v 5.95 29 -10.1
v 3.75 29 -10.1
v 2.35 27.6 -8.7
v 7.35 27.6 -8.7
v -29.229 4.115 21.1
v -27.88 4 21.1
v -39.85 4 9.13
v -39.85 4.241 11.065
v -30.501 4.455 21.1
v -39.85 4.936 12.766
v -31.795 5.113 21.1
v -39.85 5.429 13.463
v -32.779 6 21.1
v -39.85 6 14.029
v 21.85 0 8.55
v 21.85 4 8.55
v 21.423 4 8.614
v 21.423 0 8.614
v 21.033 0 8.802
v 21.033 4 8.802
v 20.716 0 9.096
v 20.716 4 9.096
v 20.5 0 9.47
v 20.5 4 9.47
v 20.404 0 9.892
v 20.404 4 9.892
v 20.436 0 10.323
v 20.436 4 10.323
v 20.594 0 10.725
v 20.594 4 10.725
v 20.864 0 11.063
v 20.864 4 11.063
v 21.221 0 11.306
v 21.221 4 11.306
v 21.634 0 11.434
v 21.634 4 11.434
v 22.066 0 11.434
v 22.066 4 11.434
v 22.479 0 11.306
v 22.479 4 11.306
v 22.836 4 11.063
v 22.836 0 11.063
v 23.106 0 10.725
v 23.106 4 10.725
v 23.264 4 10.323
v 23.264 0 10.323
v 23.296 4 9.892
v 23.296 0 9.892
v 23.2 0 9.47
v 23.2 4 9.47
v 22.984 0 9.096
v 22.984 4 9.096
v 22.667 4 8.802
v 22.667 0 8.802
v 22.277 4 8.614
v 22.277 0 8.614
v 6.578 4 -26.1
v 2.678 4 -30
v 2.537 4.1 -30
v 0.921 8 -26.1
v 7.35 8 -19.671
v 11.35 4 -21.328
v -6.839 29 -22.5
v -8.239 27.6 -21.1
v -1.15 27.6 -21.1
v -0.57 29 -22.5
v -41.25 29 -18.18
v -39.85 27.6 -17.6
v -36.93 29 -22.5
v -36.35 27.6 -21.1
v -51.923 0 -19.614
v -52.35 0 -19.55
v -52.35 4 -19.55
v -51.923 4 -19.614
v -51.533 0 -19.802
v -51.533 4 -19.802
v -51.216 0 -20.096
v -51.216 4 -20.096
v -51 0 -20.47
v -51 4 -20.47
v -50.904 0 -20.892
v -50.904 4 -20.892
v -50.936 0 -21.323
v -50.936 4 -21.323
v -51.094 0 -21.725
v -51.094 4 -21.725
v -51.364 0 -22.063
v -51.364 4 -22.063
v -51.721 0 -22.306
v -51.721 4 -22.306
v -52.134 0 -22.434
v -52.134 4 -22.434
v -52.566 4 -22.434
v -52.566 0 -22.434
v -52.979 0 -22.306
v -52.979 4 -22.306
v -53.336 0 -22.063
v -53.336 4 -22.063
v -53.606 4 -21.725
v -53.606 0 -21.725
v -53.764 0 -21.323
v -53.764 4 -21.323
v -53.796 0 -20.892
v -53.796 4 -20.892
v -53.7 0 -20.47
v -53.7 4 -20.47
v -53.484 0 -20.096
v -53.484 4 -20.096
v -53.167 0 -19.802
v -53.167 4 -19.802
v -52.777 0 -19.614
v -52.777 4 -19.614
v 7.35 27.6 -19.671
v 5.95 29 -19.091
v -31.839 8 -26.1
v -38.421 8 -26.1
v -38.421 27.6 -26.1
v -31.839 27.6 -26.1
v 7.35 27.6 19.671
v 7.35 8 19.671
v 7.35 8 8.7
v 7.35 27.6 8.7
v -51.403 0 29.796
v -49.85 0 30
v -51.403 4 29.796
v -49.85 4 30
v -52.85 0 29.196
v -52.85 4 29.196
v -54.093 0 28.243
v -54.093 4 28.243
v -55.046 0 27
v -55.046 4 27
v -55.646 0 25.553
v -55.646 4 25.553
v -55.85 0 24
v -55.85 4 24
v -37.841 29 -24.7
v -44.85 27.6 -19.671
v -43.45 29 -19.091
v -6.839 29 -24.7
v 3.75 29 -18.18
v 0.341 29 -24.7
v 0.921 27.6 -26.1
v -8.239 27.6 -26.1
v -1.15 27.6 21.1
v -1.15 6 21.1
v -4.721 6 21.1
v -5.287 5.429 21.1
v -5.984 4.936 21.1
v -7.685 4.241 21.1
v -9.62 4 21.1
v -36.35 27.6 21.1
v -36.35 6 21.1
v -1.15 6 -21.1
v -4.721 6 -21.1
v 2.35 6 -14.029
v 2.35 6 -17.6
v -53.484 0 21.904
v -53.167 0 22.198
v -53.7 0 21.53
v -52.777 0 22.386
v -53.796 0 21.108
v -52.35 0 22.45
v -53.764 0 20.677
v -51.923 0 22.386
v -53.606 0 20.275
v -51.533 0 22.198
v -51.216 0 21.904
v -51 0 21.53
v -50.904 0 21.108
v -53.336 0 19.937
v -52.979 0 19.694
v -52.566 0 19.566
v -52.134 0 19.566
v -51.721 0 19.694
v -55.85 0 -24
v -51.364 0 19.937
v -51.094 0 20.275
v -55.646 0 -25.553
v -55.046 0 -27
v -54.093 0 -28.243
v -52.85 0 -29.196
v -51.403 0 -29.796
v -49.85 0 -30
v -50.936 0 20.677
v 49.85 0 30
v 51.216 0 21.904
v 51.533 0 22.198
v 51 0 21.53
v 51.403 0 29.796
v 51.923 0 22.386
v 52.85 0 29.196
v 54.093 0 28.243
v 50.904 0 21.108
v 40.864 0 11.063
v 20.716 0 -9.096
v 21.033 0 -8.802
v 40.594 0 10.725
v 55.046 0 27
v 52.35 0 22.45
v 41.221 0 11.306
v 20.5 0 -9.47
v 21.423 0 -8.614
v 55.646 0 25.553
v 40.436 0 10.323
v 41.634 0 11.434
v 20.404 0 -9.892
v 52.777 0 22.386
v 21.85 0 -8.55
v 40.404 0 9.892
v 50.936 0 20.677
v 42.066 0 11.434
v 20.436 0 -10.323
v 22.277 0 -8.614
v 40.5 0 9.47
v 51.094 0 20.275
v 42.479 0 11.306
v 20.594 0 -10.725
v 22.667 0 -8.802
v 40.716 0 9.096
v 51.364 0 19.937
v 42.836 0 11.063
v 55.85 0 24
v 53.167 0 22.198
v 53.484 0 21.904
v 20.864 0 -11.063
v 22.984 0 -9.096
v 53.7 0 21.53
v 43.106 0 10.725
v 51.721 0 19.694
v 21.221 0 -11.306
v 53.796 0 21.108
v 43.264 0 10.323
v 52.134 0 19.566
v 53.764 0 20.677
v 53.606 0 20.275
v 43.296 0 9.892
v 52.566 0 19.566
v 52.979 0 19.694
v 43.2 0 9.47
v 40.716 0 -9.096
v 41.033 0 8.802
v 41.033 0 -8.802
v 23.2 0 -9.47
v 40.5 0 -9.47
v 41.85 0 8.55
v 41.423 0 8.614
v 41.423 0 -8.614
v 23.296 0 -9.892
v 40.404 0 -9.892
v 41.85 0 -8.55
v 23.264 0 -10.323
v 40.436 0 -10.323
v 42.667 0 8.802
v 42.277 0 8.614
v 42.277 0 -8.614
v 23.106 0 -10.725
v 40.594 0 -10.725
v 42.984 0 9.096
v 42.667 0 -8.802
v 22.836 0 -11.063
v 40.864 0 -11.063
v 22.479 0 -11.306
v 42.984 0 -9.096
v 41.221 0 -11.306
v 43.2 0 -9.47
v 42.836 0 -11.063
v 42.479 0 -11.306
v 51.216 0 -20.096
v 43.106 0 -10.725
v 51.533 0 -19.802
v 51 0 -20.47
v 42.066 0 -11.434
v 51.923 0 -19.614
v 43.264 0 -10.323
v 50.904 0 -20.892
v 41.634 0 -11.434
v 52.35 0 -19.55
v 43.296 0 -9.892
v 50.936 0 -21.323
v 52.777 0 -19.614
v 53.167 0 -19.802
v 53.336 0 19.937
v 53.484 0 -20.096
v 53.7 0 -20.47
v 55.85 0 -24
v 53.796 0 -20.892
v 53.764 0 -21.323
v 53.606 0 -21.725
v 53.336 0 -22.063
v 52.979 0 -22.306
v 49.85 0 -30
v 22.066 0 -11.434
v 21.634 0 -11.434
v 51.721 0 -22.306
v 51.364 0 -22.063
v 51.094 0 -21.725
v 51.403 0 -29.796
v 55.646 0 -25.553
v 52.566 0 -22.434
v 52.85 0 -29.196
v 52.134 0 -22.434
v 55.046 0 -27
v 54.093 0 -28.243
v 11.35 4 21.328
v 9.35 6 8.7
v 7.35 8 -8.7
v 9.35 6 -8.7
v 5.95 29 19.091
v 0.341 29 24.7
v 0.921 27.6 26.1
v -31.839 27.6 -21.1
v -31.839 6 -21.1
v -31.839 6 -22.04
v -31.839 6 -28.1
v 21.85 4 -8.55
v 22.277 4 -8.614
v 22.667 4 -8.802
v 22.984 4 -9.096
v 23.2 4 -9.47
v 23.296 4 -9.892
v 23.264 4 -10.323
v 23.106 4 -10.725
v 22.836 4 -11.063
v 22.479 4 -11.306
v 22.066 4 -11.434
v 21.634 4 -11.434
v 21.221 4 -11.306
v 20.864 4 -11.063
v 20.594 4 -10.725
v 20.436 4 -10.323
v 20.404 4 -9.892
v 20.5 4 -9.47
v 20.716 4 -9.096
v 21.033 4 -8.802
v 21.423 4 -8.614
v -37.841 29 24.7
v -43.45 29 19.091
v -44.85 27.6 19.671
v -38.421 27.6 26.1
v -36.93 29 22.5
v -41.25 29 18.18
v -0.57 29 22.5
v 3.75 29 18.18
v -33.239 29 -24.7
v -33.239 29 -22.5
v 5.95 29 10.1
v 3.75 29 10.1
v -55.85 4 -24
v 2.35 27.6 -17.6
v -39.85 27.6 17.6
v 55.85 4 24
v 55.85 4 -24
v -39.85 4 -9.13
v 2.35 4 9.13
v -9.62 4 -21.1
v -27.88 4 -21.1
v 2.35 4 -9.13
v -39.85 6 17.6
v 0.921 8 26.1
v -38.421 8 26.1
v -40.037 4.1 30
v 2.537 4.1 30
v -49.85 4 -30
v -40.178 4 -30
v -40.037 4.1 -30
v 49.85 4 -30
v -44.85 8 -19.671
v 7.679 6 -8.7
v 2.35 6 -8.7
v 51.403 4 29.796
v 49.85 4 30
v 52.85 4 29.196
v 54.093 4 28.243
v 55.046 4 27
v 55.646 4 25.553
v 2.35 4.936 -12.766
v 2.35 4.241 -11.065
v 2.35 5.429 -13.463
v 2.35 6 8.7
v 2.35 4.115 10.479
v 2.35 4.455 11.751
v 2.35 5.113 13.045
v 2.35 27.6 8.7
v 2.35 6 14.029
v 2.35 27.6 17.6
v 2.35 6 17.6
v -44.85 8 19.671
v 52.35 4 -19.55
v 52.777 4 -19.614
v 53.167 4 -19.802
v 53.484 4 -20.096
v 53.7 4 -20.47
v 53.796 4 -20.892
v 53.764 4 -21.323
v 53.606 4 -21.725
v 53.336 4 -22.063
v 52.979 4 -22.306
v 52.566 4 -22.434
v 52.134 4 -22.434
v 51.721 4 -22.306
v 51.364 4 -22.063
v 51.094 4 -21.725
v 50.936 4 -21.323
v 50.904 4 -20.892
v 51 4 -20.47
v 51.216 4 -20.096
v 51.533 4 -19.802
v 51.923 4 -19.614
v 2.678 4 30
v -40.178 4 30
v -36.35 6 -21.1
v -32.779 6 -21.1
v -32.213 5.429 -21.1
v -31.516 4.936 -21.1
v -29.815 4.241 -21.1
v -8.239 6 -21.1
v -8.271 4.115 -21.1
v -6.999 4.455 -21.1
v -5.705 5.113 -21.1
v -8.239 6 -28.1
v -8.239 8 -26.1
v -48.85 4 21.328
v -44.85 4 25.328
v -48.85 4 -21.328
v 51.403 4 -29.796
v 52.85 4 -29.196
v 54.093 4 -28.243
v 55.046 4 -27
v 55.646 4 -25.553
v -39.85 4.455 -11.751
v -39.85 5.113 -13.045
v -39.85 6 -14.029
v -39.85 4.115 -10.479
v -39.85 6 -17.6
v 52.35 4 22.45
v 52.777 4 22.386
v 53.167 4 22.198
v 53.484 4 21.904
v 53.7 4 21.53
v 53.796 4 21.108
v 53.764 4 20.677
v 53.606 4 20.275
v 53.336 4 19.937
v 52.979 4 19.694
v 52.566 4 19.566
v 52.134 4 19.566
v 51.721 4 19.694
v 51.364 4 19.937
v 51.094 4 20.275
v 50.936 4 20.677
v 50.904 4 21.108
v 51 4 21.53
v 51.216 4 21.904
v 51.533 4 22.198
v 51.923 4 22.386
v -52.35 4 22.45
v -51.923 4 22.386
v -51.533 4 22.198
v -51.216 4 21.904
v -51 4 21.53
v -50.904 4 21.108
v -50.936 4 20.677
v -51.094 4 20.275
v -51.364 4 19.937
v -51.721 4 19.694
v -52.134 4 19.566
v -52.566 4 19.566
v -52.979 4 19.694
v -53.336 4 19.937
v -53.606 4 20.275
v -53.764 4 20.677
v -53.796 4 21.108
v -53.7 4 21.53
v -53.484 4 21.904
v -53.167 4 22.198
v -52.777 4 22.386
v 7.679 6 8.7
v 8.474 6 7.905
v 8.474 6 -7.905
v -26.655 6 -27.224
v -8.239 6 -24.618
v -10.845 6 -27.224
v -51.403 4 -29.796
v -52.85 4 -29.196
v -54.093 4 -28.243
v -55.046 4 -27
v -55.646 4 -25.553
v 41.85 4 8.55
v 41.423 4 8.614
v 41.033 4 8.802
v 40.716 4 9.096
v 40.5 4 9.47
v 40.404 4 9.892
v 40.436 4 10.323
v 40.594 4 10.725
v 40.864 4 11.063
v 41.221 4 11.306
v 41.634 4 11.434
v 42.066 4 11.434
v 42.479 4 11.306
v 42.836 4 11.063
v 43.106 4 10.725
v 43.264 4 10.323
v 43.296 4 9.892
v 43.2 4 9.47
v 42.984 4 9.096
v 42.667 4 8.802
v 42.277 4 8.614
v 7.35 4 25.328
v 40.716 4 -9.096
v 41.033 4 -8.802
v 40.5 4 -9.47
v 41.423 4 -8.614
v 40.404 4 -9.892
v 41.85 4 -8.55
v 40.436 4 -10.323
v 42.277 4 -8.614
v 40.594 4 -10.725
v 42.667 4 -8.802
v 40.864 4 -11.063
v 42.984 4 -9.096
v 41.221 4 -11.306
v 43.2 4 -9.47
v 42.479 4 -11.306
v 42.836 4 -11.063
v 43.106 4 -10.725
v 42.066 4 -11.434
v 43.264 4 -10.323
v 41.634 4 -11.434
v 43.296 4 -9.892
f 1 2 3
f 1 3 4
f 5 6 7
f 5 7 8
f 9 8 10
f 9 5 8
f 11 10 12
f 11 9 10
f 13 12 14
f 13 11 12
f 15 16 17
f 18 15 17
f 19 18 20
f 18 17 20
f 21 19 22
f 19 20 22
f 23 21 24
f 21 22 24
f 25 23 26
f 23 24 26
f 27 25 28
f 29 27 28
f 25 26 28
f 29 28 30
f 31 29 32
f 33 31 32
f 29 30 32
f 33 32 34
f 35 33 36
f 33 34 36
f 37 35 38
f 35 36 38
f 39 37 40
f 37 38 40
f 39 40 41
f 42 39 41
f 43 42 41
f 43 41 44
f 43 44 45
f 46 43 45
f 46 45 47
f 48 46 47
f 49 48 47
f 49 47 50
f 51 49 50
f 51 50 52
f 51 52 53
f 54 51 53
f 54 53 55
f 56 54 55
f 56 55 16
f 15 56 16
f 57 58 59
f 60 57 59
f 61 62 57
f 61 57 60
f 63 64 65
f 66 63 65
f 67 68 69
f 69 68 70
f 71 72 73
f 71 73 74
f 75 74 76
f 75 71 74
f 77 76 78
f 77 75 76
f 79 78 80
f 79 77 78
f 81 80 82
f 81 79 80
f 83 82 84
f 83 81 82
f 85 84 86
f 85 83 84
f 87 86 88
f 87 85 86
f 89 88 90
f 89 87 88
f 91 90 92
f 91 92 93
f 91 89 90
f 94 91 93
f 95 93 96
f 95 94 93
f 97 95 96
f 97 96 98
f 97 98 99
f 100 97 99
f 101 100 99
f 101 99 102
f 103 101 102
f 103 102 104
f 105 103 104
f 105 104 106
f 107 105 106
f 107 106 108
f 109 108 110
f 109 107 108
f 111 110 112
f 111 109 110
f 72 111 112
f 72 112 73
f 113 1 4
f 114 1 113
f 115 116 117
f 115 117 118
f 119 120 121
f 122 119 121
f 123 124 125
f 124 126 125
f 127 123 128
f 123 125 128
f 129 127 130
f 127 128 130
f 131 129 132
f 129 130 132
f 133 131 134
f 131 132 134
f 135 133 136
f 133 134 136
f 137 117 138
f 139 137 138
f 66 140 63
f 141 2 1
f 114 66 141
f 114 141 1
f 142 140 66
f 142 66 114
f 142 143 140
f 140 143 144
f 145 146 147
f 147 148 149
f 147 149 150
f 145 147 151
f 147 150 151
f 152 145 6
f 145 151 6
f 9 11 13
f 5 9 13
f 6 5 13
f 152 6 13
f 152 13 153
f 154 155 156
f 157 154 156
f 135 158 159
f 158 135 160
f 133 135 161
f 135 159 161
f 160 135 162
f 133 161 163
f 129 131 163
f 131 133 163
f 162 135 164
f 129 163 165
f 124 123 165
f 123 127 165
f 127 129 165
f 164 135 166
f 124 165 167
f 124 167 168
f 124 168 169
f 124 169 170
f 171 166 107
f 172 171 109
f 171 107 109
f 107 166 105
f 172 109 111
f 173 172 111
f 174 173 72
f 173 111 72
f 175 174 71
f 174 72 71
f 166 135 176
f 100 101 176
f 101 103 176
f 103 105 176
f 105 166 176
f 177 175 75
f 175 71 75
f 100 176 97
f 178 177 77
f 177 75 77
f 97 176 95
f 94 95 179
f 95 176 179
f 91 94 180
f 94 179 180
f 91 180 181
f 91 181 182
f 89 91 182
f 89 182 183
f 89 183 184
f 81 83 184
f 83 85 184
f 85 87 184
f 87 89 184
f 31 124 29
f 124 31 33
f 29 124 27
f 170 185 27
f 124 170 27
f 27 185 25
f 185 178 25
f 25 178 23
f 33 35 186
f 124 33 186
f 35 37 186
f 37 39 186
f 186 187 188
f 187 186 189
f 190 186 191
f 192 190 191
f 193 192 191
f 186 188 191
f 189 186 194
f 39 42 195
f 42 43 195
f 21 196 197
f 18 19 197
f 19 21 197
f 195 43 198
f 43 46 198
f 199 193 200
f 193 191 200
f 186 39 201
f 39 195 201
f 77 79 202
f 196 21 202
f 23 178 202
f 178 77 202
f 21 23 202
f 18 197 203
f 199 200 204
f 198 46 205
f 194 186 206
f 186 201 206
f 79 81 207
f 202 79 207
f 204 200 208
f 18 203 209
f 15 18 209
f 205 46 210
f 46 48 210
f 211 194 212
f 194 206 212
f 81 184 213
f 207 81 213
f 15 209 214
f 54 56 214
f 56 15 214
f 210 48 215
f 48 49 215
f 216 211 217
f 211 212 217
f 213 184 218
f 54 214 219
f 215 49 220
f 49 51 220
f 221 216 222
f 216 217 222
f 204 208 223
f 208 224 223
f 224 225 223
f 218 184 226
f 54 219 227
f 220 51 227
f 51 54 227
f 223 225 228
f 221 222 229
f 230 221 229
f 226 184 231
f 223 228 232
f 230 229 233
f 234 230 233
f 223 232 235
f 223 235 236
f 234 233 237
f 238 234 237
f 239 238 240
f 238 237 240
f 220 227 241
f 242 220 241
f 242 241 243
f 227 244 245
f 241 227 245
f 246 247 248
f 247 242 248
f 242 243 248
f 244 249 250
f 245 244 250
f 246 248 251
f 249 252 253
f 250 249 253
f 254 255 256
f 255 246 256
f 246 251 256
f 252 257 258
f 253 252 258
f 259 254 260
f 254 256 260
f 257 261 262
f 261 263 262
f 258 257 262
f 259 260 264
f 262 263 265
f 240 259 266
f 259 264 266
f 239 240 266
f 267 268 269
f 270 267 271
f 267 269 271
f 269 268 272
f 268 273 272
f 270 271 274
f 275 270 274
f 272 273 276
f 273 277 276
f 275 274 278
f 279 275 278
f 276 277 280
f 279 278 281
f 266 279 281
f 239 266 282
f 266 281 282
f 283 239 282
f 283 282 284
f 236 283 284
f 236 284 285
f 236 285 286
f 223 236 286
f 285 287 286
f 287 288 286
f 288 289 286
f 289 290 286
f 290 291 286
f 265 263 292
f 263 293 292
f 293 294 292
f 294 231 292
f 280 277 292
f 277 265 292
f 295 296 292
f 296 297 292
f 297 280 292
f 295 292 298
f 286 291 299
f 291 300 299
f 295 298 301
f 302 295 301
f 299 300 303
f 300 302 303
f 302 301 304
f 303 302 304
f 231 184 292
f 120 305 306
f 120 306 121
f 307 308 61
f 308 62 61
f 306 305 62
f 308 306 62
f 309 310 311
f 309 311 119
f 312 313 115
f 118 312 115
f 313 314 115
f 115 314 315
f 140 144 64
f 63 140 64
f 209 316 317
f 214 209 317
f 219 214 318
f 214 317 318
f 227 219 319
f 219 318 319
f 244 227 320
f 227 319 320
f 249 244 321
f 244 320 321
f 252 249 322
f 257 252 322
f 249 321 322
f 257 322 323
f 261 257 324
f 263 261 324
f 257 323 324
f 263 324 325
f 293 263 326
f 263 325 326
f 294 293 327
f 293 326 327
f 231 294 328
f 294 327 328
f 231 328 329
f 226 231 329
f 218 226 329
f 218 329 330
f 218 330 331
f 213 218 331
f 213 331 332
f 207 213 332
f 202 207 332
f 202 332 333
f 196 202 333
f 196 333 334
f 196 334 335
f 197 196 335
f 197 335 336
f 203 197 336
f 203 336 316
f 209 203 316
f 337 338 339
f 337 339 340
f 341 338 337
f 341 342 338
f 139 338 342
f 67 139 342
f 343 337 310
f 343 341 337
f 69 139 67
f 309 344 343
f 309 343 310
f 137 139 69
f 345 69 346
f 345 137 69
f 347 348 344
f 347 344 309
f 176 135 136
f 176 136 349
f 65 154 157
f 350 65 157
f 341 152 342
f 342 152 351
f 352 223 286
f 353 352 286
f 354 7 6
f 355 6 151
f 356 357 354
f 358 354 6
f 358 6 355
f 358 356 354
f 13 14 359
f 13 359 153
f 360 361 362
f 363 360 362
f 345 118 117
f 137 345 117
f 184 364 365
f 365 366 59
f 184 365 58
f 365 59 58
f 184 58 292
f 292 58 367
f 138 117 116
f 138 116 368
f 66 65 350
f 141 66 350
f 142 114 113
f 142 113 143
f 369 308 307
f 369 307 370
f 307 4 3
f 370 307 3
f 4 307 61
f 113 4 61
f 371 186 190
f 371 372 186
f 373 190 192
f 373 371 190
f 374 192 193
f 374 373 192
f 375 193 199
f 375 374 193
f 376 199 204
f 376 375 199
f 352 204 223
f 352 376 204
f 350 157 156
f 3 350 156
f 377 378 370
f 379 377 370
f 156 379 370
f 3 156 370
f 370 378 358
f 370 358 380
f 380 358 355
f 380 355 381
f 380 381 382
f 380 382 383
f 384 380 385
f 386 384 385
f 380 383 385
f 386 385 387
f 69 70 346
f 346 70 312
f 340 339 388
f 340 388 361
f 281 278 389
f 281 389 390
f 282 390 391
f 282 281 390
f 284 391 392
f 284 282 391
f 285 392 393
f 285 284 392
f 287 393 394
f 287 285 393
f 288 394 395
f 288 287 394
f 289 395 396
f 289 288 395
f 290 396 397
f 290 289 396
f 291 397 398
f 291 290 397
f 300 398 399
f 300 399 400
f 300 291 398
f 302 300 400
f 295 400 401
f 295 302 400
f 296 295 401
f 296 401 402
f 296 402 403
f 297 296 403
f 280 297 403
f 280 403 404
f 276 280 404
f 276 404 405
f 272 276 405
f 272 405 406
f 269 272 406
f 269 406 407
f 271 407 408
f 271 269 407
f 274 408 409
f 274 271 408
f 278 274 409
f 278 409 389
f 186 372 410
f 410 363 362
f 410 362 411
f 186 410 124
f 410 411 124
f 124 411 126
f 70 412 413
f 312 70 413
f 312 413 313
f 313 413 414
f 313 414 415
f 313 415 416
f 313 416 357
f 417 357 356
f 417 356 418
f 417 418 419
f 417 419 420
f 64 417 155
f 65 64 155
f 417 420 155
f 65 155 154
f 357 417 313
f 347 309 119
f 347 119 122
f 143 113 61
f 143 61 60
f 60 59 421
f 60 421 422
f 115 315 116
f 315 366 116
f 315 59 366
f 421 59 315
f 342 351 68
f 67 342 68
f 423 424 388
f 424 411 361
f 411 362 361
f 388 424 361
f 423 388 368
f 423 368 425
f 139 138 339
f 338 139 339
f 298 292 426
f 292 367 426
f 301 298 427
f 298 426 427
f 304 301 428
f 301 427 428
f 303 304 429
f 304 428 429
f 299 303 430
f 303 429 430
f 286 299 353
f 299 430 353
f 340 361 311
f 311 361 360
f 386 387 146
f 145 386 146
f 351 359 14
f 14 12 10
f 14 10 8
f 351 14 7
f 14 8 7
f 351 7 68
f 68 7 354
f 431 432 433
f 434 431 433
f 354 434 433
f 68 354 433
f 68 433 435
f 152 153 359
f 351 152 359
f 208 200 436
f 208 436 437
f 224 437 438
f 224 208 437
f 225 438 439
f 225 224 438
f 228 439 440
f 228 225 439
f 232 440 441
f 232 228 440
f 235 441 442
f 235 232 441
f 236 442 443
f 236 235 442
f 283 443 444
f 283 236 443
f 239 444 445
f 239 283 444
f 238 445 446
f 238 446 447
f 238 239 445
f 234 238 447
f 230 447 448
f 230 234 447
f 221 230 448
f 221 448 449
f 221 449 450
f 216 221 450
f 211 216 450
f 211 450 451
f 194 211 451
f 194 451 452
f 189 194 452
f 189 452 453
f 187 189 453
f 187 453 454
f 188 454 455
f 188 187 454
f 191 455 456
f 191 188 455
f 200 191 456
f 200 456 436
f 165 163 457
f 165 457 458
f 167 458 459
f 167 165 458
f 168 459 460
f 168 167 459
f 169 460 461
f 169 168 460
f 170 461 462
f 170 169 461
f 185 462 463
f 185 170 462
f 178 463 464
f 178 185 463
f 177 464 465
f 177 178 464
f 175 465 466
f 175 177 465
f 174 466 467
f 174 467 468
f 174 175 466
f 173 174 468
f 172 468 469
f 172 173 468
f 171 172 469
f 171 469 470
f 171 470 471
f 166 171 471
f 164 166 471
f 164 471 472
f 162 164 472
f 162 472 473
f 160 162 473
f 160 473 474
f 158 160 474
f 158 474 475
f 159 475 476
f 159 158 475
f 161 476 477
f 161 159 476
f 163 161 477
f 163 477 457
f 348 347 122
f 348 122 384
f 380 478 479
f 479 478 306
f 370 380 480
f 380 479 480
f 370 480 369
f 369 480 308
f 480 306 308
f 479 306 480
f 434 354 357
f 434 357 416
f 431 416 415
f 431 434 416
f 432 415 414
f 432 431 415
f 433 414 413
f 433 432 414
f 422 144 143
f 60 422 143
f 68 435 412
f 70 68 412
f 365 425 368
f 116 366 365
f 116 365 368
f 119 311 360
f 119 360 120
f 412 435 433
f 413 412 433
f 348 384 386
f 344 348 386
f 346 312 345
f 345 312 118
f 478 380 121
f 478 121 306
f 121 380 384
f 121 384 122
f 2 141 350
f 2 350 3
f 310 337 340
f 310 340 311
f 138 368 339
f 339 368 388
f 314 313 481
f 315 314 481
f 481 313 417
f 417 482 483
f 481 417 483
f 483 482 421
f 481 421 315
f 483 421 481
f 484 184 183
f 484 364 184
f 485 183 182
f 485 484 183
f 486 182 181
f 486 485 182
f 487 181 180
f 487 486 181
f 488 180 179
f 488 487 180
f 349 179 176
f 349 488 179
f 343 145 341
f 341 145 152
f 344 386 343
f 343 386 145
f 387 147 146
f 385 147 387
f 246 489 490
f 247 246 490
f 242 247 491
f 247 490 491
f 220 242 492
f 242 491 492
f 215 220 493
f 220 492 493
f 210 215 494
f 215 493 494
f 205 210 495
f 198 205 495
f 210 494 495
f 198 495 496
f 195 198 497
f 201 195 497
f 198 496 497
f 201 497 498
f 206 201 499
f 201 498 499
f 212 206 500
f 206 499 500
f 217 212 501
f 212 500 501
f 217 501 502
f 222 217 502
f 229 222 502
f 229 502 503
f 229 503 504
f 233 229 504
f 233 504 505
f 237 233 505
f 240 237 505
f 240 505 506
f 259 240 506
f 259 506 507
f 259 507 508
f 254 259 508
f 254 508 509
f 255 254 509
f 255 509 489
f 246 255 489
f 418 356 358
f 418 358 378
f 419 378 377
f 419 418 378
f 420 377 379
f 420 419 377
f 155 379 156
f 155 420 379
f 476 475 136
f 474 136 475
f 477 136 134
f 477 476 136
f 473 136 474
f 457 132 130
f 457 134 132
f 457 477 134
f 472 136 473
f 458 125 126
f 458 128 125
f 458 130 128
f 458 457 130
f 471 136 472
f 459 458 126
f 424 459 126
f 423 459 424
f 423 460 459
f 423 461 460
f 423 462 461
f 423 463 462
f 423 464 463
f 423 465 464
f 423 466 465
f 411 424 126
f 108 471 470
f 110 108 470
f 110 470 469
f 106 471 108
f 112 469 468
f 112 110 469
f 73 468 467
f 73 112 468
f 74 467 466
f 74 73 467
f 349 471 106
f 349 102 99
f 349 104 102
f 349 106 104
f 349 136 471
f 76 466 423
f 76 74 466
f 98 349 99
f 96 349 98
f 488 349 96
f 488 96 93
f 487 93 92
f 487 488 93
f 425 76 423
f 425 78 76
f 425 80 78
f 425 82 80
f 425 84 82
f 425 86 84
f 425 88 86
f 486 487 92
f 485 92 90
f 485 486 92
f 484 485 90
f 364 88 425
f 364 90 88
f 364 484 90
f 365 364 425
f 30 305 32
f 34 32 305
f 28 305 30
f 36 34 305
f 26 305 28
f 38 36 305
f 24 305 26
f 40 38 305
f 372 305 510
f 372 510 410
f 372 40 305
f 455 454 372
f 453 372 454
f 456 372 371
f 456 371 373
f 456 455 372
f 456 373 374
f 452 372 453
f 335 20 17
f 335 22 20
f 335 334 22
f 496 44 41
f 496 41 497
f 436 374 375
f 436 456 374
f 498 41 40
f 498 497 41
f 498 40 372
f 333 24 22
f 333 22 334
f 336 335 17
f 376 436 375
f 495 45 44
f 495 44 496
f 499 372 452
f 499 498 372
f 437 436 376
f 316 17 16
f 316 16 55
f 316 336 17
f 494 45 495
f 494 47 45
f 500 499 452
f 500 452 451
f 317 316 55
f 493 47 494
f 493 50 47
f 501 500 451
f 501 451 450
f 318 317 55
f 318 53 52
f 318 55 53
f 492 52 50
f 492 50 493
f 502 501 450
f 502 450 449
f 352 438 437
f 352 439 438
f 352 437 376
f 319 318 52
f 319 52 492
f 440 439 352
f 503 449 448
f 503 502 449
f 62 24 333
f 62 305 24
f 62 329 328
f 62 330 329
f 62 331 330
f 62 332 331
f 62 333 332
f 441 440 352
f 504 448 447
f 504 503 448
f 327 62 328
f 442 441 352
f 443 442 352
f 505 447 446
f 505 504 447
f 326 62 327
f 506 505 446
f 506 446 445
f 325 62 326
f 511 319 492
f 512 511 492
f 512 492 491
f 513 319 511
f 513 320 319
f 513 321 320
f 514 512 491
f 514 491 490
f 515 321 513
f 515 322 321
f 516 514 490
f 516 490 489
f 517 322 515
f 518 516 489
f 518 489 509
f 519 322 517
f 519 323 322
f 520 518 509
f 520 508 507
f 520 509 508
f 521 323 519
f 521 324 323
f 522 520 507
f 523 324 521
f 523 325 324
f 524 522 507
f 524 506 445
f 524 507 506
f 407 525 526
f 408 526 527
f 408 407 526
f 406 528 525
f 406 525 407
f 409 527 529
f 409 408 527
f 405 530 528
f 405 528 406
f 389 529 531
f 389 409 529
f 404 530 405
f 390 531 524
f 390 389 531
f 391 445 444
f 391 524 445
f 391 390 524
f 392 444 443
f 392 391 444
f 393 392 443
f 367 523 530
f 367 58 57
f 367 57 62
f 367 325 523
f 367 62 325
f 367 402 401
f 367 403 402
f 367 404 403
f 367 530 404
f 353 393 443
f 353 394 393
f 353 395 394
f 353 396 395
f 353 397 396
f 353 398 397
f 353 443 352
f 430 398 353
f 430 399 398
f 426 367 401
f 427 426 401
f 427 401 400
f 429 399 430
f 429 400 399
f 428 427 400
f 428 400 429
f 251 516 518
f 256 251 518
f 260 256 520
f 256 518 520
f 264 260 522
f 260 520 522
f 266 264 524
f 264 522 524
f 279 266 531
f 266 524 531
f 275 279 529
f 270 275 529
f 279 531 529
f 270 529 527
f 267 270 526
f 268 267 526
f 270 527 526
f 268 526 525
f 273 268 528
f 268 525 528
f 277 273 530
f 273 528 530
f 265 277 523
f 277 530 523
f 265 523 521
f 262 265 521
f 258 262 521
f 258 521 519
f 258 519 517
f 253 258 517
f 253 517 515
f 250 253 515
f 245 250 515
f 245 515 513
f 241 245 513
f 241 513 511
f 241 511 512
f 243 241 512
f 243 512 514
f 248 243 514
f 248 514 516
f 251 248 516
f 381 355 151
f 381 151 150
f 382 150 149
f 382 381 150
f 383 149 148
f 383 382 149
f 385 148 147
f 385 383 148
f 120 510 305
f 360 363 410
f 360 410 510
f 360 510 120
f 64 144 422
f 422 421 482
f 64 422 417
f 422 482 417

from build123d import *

# Parameters (mm, degrees)
SKETCH_1_W          = 111.7
SKETCH_1_H          = 60
SKETCH_1_R          = 1.45
EXTRUDE_1_DEPTH     = 4
EXTRUDE_2_DEPTH     = 25
SKETCH_4_W          = 23.6
SKETCH_4_H          = 5
SKETCH_4_W_2        = 5
SKETCH_4_H_2        = 17.4
EXTRUDE_3_DEPTH     = 2
CHAMFER_1_SIZE      = 4
FILLET_1_R          = 6
SKETCH_5_R          = 1.45
CUT_EXTRUDE_1_DEPTH = 69.148532633
CHAMFER_2_SIZE      = 1.4
FILLET_2_R          = 4


with BuildPart() as part:
    # 草图1 → 凸台-拉伸1 (new body)
    with BuildSketch(Plane(origin=(0, 0, 0), x_dir=(1, 0, 0), z_dir=(0, 1, 0))):
        Rectangle(SKETCH_1_W, SKETCH_1_H)
        with Locations(Location((-52.35, 21, 0), (0, 0, 270))):
            Circle(SKETCH_1_R, mode=Mode.SUBTRACT)
        with Locations(Location((52.35, 21, 0), (0, 0, 270))):
            Circle(SKETCH_1_R, mode=Mode.SUBTRACT)
        with Locations(Location((52.35, -21, 0), (0, 0, 270))):
            Circle(SKETCH_1_R, mode=Mode.SUBTRACT)
        with Locations(Location((-52.35, -21, 0), (0, 0, 270))):
            Circle(SKETCH_1_R, mode=Mode.SUBTRACT)
    extrude(amount=EXTRUDE_1_DEPTH)

    # 草图3 → 凸台-拉伸2 (add)
    with BuildSketch(Plane(origin=(0, 4, 0), x_dir=(1, 0, 0), z_dir=(0, 1, 0))):
        Polygon((-36.35, 21.1), (-31.839090409, 21.1), (-31.839090409, 26.1), (-38.421067812, 26.1), (-44.85, 19.671067812), (-44.85, -19.671067812), (-38.421067812, -26.1), (0.921067812, -26.1), (7.35, -19.671067812), (7.35, -8.7), (2.35, -8.7), (2.35, -17.6), (-1.15, -21.1), (-36.35, -21.1), (-39.85, -17.6), (-39.85, 17.6), align=None)
        Polygon((-8.239090409, 21.1), (-1.15, 21.1), (2.35, 17.6), (2.35, 8.7), (7.35, 8.7), (7.35, 19.671067812), (0.921067812, 26.1), (-8.239090409, 26.1), align=None)
    extrude(amount=EXTRUDE_2_DEPTH)

    # 草图4 → 凸台-拉伸3 (add)
    with BuildSketch(Plane(origin=(0, 4, 0), x_dir=(1, 0, 0), z_dir=(0, 1, 0))):
        with Locations((-20.039090409, 23.6)):
            Rectangle(SKETCH_4_W, SKETCH_4_H)
        with Locations((4.85, 0)):
            Rectangle(SKETCH_4_W_2, SKETCH_4_H_2)
        Polygon((-39.85, 17.6), (-39.85, 14.028932188), (-32.778932188, 21.1), (-36.35, 21.1), align=None)
        Polygon((-4.721067812, 21.1), (2.35, 14.028932188), (2.35, 17.6), (-1.15, 21.1), align=None)
        Polygon((2.35, -17.6), (2.35, -14.028932188), (-4.721067812, -21.1), (-1.15, -21.1), align=None)
        Polygon((-36.35, -21.1), (-32.778932188, -21.1), (-39.85, -14.028932188), (-39.85, -17.6), align=None)
    extrude(amount=EXTRUDE_3_DEPTH)

    # 倒角1
    # the kernel refuses this chamfer: 4 mm, written as the material it adds along each edge
    with BuildSketch(Plane(origin=(-31.147249892, 4, -33.373817919), x_dir=(-0.7071067811865474, 0, -0.7071067811865478), z_dir=(-0.7071067811865478, 0, 0.7071067811865474))) as chamfer_1_piece_1_section:
        Polygon((CHAMFER_1_SIZE, 0), (0, -CHAMFER_1_SIZE), (0, 0), align=None)
    chamfer_1_piece_1 = extrude(amount=29.665346996, mode=Mode.PRIVATE)
    chamfer_1_piece_1 = split(chamfer_1_piece_1, bisect_by=Plane(origin=(-31.147249892, 4, -30), z_dir=(0, 0, 1)), keep=Keep.TOP, mode=Mode.PRIVATE)
    chamfer_1_piece_1 = split(chamfer_1_piece_1, bisect_by=Plane(origin=(-39.998624946, 12.851375054, -33.373817919), z_dir=(0.7071067811865476, -0.7071067811865476, 0)), keep=Keep.TOP, mode=Mode.PRIVATE)
    chamfer_1_piece_1 = split(chamfer_1_piece_1, bisect_by=Plane(origin=(-31.147249892, 2.36309104, -31.73690896), z_dir=(0, -0.7071067811865476, 0.7071067811865476)), keep=Keep.TOP, mode=Mode.PRIVATE)
    add(chamfer_1_piece_1)
    with BuildSketch(Plane(origin=(-48.707799764, 4, -26.1), x_dir=(0, 0, -1), z_dir=(1, 0, 0))) as chamfer_1_piece_2_section:
        Polygon((CHAMFER_1_SIZE, 0), (0, CHAMFER_1_SIZE), (0, 0), align=None)
    chamfer_1_piece_2 = extrude(amount=59.915599527, mode=Mode.PRIVATE)
    chamfer_1_piece_2 = split(chamfer_1_piece_2, bisect_by=Plane(origin=(-48.707799764, 6, -26.1), z_dir=(0, -1, 0)), keep=Keep.TOP, mode=Mode.PRIVATE)
    chamfer_1_piece_2 = split(chamfer_1_piece_2, bisect_by=Plane(origin=(-48.707799764, 4, -30), z_dir=(0, 0, 1)), keep=Keep.TOP, mode=Mode.PRIVATE)
    chamfer_1_piece_2 = split(chamfer_1_piece_2, bisect_by=Plane(origin=(-34.886369307, 23.546454403, -39.921430456), z_dir=(-0.4999999999999999, -0.7071067811865478, 0.49999999999999967)), keep=Keep.TOP, mode=Mode.PRIVATE)
    chamfer_1_piece_2 = split(chamfer_1_piece_2, bisect_by=Plane(origin=(-47.550330338, 2.36309104, -24.942530574), z_dir=(0.4999999999999996, -0.7071067811865479, 0.4999999999999999)), keep=Keep.TOP, mode=Mode.PRIVATE)
    add(chamfer_1_piece_2)
    with BuildSketch(Plane(origin=(-48.707799764, 4, -26.1), x_dir=(0, 0, -1), z_dir=(1, 0, 0))) as chamfer_1_piece_3_section:
        Polygon((CHAMFER_1_SIZE, 0), (0, CHAMFER_1_SIZE), (0, 0), align=None)
    chamfer_1_piece_3 = extrude(amount=59.915599527, mode=Mode.PRIVATE)
    chamfer_1_piece_3 = split(chamfer_1_piece_3, bisect_by=Plane(origin=(-31.839090409, 4, -26.1), z_dir=(-1, 0, 0)), keep=Keep.TOP, mode=Mode.PRIVATE)
    chamfer_1_piece_3 = split(chamfer_1_piece_3, bisect_by=Plane(origin=(-48.707799764, 4, -30), z_dir=(0, 0, 1)), keep=Keep.TOP, mode=Mode.PRIVATE)
    chamfer_1_piece_3 = split(chamfer_1_piece_3, bisect_by=Plane(origin=(-47.550330338, 2.36309104, -24.942530574), z_dir=(0.4999999999999996, -0.7071067811865479, 0.4999999999999999)), keep=Keep.TOP, mode=Mode.PRIVATE)
    add(chamfer_1_piece_3)
    with BuildSketch(Plane(origin=(-48.707799764, 4, -26.1), x_dir=(0, 0, -1), z_dir=(1, 0, 0))) as chamfer_1_piece_4_section:
        Polygon((CHAMFER_1_SIZE, 0), (0, CHAMFER_1_SIZE), (0, 0), align=None)
    chamfer_1_piece_4 = extrude(amount=59.915599527, mode=Mode.PRIVATE)
    chamfer_1_piece_4 = split(chamfer_1_piece_4, bisect_by=Plane(origin=(-8.239090409, 4, -26.1), z_dir=(1, 0, 0)), keep=Keep.TOP, mode=Mode.PRIVATE)
    chamfer_1_piece_4 = split(chamfer_1_piece_4, bisect_by=Plane(origin=(-48.707799764, 4, -30), z_dir=(0, 0, 1)), keep=Keep.TOP, mode=Mode.PRIVATE)
    chamfer_1_piece_4 = split(chamfer_1_piece_4, bisect_by=Plane(origin=(-34.886369307, 23.546454403, -39.921430456), z_dir=(-0.4999999999999999, -0.7071067811865478, 0.49999999999999967)), keep=Keep.TOP, mode=Mode.PRIVATE)
    add(chamfer_1_piece_4)
    with BuildSketch(Plane(origin=(14.623817919, 4, -12.397249892), x_dir=(0.7071067811865477, 0, -0.7071067811865475), z_dir=(-0.7071067811865475, 0, -0.7071067811865477))) as chamfer_1_piece_5_section:
        Polygon((CHAMFER_1_SIZE, 0), (0, -CHAMFER_1_SIZE), (0, 0), align=None)
    chamfer_1_piece_5 = extrude(amount=29.665346996, mode=Mode.PRIVATE)
    chamfer_1_piece_5 = split(chamfer_1_piece_5, bisect_by=Plane(origin=(14.623817919, 4, -30), z_dir=(0, 0, 1)), keep=Keep.TOP, mode=Mode.PRIVATE)
    chamfer_1_piece_5 = split(chamfer_1_piece_5, bisect_by=Plane(origin=(12.98690896, 2.36309104, -12.397249892), z_dir=(-0.7071067811865476, -0.7071067811865476, 0)), keep=Keep.TOP, mode=Mode.PRIVATE)
    chamfer_1_piece_5 = split(chamfer_1_piece_5, bisect_by=Plane(origin=(14.623817919, 12.851375054, -21.248624946), z_dir=(0, -0.7071067811865476, 0.7071067811865476)), keep=Keep.TOP, mode=Mode.PRIVATE)
    add(chamfer_1_piece_5)
    with BuildSketch(Plane(origin=(-44.85, 4, -29.957799764), x_dir=(-1, 0, 0), z_dir=(0, 0, 1))) as chamfer_1_piece_6_section:
        Polygon((CHAMFER_1_SIZE, 0), (0, -CHAMFER_1_SIZE), (0, 0), align=None)
    chamfer_1_piece_6 = extrude(amount=59.915599527, mode=Mode.PRIVATE)
    chamfer_1_piece_6 = split(chamfer_1_piece_6, bisect_by=Plane(origin=(-58.671430456, 23.546454403, -16.136369307), z_dir=(0.5000000000000001, -0.7071067811865477, -0.5000000000000001)), keep=Keep.TOP, mode=Mode.PRIVATE)
    chamfer_1_piece_6 = split(chamfer_1_piece_6, bisect_by=Plane(origin=(-43.692530574, 2.36309104, -28.800330338), z_dir=(0.4999999999999996, -0.7071067811865479, 0.4999999999999999)), keep=Keep.TOP, mode=Mode.PRIVATE)
    add(chamfer_1_piece_6)
    with BuildSketch(Plane(origin=(-52.123817919, 4, 12.397249892), x_dir=(-0.7071067811865476, 0, 0.7071067811865476), z_dir=(0.7071067811865476, 0, 0.7071067811865476))) as chamfer_1_piece_7_section:
        Polygon((CHAMFER_1_SIZE, 0), (0, -CHAMFER_1_SIZE), (0, 0), align=None)
    chamfer_1_piece_7 = extrude(amount=29.665346996, mode=Mode.PRIVATE)
    chamfer_1_piece_7 = split(chamfer_1_piece_7, bisect_by=Plane(origin=(-52.123817919, 4, 30), z_dir=(0, 0, -1)), keep=Keep.TOP, mode=Mode.PRIVATE)
    chamfer_1_piece_7 = split(chamfer_1_piece_7, bisect_by=Plane(origin=(-52.123817919, 12.851375054, 21.248624946), z_dir=(0, -0.7071067811865472, -0.7071067811865479)), keep=Keep.TOP, mode=Mode.PRIVATE)
    chamfer_1_piece_7 = split(chamfer_1_piece_7, bisect_by=Plane(origin=(-50.48690896, 2.36309104, 12.397249892), z_dir=(0.7071067811865476, -0.7071067811865476, 0)), keep=Keep.TOP, mode=Mode.PRIVATE)
    add(chamfer_1_piece_7)
    with BuildSketch(Plane(origin=(7.35, 4, -29.957799764), x_dir=(1, 0, 0), z_dir=(0, 0, 1))) as chamfer_1_piece_8_section:
        Polygon((CHAMFER_1_SIZE, 0), (0, CHAMFER_1_SIZE), (0, 0), align=None)
    chamfer_1_piece_8 = extrude(amount=59.915599527, mode=Mode.PRIVATE)
    chamfer_1_piece_8 = split(chamfer_1_piece_8, bisect_by=Plane(origin=(7.35, 6, -29.957799764), z_dir=(0, -1, 0)), keep=Keep.TOP, mode=Mode.PRIVATE)
    chamfer_1_piece_8 = split(chamfer_1_piece_8, bisect_by=Plane(origin=(6.192530574, 2.36309104, -28.800330338), z_dir=(-0.4999999999999999, -0.7071067811865478, 0.49999999999999967)), keep=Keep.TOP, mode=Mode.PRIVATE)
    chamfer_1_piece_8 = split(chamfer_1_piece_8, bisect_by=Plane(origin=(21.171430456, 23.546454403, -16.136369307), z_dir=(-0.5000000000000004, -0.7071067811865477, -0.4999999999999993)), keep=Keep.TOP, mode=Mode.PRIVATE)
    add(chamfer_1_piece_8)
    with BuildSketch(Plane(origin=(7.35, 4, -29.957799764), x_dir=(1, 0, 0), z_dir=(0, 0, 1))) as chamfer_1_piece_9_section:
        Polygon((CHAMFER_1_SIZE, 0), (0, CHAMFER_1_SIZE), (0, 0), align=None)
    chamfer_1_piece_9 = extrude(amount=59.915599527, mode=Mode.PRIVATE)
    chamfer_1_piece_9 = split(chamfer_1_piece_9, bisect_by=Plane(origin=(7.35, 4, -8.7), z_dir=(0, 0, -1)), keep=Keep.TOP, mode=Mode.PRIVATE)
    chamfer_1_piece_9 = split(chamfer_1_piece_9, bisect_by=Plane(origin=(6.192530574, 2.36309104, -28.800330338), z_dir=(-0.4999999999999999, -0.7071067811865478, 0.49999999999999967)), keep=Keep.TOP, mode=Mode.PRIVATE)
    add(chamfer_1_piece_9)
    with BuildSketch(Plane(origin=(7.35, 4, -29.957799764), x_dir=(1, 0, 0), z_dir=(0, 0, 1))) as chamfer_1_piece_10_section:
        Polygon((CHAMFER_1_SIZE, 0), (0, CHAMFER_1_SIZE), (0, 0), align=None)
    chamfer_1_piece_10 = extrude(amount=59.915599527, mode=Mode.PRIVATE)
    chamfer_1_piece_10 = split(chamfer_1_piece_10, bisect_by=Plane(origin=(7.35, 4, 8.7), z_dir=(0, 0, 1)), keep=Keep.TOP, mode=Mode.PRIVATE)
    chamfer_1_piece_10 = split(chamfer_1_piece_10, bisect_by=Plane(origin=(21.171430456, 23.546454403, -16.136369307), z_dir=(-0.5000000000000004, -0.7071067811865477, -0.4999999999999993)), keep=Keep.TOP, mode=Mode.PRIVATE)
    add(chamfer_1_piece_10)
    with BuildSketch(Plane(origin=(-6.352750108, 4, 33.373817919), x_dir=(0.7071067811865483, 0, 0.7071067811865468), z_dir=(0.7071067811865467, 0, -0.7071067811865483))) as chamfer_1_piece_11_section:
        Polygon((CHAMFER_1_SIZE, 0), (0, -CHAMFER_1_SIZE), (0, 0), align=None)
    chamfer_1_piece_11 = extrude(amount=29.665346996, mode=Mode.PRIVATE)
    chamfer_1_piece_11 = split(chamfer_1_piece_11, bisect_by=Plane(origin=(-6.352750108, 4, 30), z_dir=(0, 0, -1)), keep=Keep.TOP, mode=Mode.PRIVATE)
    chamfer_1_piece_11 = split(chamfer_1_piece_11, bisect_by=Plane(origin=(2.498624946, 12.851375054, 33.373817919), z_dir=(-0.7071067811865476, -0.7071067811865476, 0)), keep=Keep.TOP, mode=Mode.PRIVATE)
    chamfer_1_piece_11 = split(chamfer_1_piece_11, bisect_by=Plane(origin=(-6.352750108, 2.36309104, 31.73690896), z_dir=(0, -0.7071067811865472, -0.7071067811865479)), keep=Keep.TOP, mode=Mode.PRIVATE)
    add(chamfer_1_piece_11)
    with BuildSketch(Plane(origin=(-48.707799764, 4, 26.1), x_dir=(0, 0, 1), z_dir=(1, 0, 0))) as chamfer_1_piece_12_section:
        Polygon((CHAMFER_1_SIZE, 0), (0, -CHAMFER_1_SIZE), (0, 0), align=None)
    chamfer_1_piece_12 = extrude(amount=59.915599527, mode=Mode.PRIVATE)
    chamfer_1_piece_12 = split(chamfer_1_piece_12, bisect_by=Plane(origin=(-48.707799764, 4, 30), z_dir=(0, 0, -1)), keep=Keep.TOP, mode=Mode.PRIVATE)
    chamfer_1_piece_12 = split(chamfer_1_piece_12, bisect_by=Plane(origin=(-34.886369307, 23.546454403, 39.921430456), z_dir=(-0.5000000000000004, -0.7071067811865477, -0.4999999999999993)), keep=Keep.TOP, mode=Mode.PRIVATE)
    chamfer_1_piece_12 = split(chamfer_1_piece_12, bisect_by=Plane(origin=(-47.550330338, 2.36309104, 24.942530574), z_dir=(0.5000000000000001, -0.7071067811865477, -0.5000000000000001)), keep=Keep.TOP, mode=Mode.PRIVATE)
    add(chamfer_1_piece_12)

    # 圆角1
    fillet_1_edges = [part.edges().sort_by_distance(p)[0] for p in [
        (55.85, 2, 30),
        (-55.85, 2, 30),
        (-55.85, 2, -30),
        (55.85, 2, -30),
    ]]
    fillet(fillet_1_edges, radius=FILLET_1_R)

    # 草图5 → 切除-拉伸1 (cut, through all)
    with BuildSketch(Plane(origin=(0, 4, 0), x_dir=(1, 0, 0), z_dir=(0, 1, 0))):
        with Locations(Location((21.85, 10, 0), (0, 0, 270))):
            Circle(SKETCH_5_R)
        with Locations(Location((41.85, 10, 0), (0, 0, 270))):
            Circle(SKETCH_5_R)
        with Locations(Location((41.85, -10, 0), (0, 0, 90))):
            Circle(SKETCH_5_R)
        with Locations(Location((21.85, -10, 0), (0, 0, 90))):
            Circle(SKETCH_5_R)
    extrude(amount=-CUT_EXTRUDE_1_DEPTH, mode=Mode.SUBTRACT)

    # 倒角2
    chamfer_2_edges = [part.edges().sort_by_distance(p)[0] for p in [
        (4.85, 29, 8.7),
        (0.6, 29, 19.35),
        (-18.75, 29, 21.1),
        (-38.1, 29, 19.35),
        (-39.85, 29, 0),
        (-35.130079111, 29, -26.1),
        (-41.635533906, 29, -22.885533906),
        (7.35, 29, 14.185533906),
        (2.35, 29, 13.15),
        (-38.1, 29, -19.35),
        (-34.094545205, 29, -21.1),
        (-31.839090409, 29, -23.6),
        (-44.85, 29, 0),
        (-41.635533906, 29, 22.885533906),
        (-18.75, 29, 26.1),
        (4.135533906, 29, 22.885533906),
        (7.35, 29, -14.185533906),
        (4.135533906, 29, -22.885533906),
        (-3.659011299, 29, -26.1),
        (-8.239090409, 29, -23.6),
        (2.35, 29, -13.15),
        (4.85, 29, -8.7),
        (-4.694545205, 29, -21.1),
        (0.6, 29, -19.35),
    ]]
    chamfer(chamfer_2_edges, length=CHAMFER_2_SIZE)

    # 圆角2
    # the kernel refuses this fillet: 4 mm, written as the material it adds along each edge
    with BuildSketch(Plane(origin=(-26.655207831, 4, 27.223724357), x_dir=(0.7071067811865476, 0, -0.7071067811865476), z_dir=(-0.7071067811865476, 0, -0.7071067811865476)), Plane(origin=(-45.973724357, 4, -7.905207831), x_dir=(0.7071067811865481, 0, 0.707106781186547), z_dir=(0.707106781186547, 0, -0.707106781186548)), Plane(origin=(-10.844792169, 4, -27.223724357), x_dir=(-0.7071067811865477, 0, 0.7071067811865475), z_dir=(0.7071067811865475, 0, 0.7071067811865476))) as fillet_2_piece_1:
        with BuildLine():
            CenterArc((3.464101615, -4), FILLET_2_R, 90, 60)
            Line((0, -2), (-0.069282032, -1.96))
            ThreePointArc((-0.069282032, -1.96), (-0.08, -1), (-0.08, 0))
            Line((-0.08, 0), (0, 0.08))
            Line((0, 0.08), (3.464101615, 0.08))
            Line((3.464101615, 0.08), (3.464101615, 0))
        make_face()
    extrude(amount=27.320508076)
    with BuildSketch(Plane(origin=(8.473724357, 4, 7.905207831), x_dir=(0, 1, 0), z_dir=(-0.7071067811865462, 0, 0.7071067811865488))) as fillet_2_piece_2:
        with BuildLine():
            CenterArc((4, 3.464101615), FILLET_2_R, 180, 60)
            Line((0, 3.464101615), (-0.08, 3.464101615))
            Line((-0.08, 3.464101615), (-0.08, 0))
            Line((-0.08, 0), (0, -0.08))
            ThreePointArc((0, -0.08), (1, -0.08), (1.96, -0.069282032))
            Line((1.96, -0.069282032), (2, 0))
        make_face()
    extrude(amount=27.320508076)


solid = part.part
